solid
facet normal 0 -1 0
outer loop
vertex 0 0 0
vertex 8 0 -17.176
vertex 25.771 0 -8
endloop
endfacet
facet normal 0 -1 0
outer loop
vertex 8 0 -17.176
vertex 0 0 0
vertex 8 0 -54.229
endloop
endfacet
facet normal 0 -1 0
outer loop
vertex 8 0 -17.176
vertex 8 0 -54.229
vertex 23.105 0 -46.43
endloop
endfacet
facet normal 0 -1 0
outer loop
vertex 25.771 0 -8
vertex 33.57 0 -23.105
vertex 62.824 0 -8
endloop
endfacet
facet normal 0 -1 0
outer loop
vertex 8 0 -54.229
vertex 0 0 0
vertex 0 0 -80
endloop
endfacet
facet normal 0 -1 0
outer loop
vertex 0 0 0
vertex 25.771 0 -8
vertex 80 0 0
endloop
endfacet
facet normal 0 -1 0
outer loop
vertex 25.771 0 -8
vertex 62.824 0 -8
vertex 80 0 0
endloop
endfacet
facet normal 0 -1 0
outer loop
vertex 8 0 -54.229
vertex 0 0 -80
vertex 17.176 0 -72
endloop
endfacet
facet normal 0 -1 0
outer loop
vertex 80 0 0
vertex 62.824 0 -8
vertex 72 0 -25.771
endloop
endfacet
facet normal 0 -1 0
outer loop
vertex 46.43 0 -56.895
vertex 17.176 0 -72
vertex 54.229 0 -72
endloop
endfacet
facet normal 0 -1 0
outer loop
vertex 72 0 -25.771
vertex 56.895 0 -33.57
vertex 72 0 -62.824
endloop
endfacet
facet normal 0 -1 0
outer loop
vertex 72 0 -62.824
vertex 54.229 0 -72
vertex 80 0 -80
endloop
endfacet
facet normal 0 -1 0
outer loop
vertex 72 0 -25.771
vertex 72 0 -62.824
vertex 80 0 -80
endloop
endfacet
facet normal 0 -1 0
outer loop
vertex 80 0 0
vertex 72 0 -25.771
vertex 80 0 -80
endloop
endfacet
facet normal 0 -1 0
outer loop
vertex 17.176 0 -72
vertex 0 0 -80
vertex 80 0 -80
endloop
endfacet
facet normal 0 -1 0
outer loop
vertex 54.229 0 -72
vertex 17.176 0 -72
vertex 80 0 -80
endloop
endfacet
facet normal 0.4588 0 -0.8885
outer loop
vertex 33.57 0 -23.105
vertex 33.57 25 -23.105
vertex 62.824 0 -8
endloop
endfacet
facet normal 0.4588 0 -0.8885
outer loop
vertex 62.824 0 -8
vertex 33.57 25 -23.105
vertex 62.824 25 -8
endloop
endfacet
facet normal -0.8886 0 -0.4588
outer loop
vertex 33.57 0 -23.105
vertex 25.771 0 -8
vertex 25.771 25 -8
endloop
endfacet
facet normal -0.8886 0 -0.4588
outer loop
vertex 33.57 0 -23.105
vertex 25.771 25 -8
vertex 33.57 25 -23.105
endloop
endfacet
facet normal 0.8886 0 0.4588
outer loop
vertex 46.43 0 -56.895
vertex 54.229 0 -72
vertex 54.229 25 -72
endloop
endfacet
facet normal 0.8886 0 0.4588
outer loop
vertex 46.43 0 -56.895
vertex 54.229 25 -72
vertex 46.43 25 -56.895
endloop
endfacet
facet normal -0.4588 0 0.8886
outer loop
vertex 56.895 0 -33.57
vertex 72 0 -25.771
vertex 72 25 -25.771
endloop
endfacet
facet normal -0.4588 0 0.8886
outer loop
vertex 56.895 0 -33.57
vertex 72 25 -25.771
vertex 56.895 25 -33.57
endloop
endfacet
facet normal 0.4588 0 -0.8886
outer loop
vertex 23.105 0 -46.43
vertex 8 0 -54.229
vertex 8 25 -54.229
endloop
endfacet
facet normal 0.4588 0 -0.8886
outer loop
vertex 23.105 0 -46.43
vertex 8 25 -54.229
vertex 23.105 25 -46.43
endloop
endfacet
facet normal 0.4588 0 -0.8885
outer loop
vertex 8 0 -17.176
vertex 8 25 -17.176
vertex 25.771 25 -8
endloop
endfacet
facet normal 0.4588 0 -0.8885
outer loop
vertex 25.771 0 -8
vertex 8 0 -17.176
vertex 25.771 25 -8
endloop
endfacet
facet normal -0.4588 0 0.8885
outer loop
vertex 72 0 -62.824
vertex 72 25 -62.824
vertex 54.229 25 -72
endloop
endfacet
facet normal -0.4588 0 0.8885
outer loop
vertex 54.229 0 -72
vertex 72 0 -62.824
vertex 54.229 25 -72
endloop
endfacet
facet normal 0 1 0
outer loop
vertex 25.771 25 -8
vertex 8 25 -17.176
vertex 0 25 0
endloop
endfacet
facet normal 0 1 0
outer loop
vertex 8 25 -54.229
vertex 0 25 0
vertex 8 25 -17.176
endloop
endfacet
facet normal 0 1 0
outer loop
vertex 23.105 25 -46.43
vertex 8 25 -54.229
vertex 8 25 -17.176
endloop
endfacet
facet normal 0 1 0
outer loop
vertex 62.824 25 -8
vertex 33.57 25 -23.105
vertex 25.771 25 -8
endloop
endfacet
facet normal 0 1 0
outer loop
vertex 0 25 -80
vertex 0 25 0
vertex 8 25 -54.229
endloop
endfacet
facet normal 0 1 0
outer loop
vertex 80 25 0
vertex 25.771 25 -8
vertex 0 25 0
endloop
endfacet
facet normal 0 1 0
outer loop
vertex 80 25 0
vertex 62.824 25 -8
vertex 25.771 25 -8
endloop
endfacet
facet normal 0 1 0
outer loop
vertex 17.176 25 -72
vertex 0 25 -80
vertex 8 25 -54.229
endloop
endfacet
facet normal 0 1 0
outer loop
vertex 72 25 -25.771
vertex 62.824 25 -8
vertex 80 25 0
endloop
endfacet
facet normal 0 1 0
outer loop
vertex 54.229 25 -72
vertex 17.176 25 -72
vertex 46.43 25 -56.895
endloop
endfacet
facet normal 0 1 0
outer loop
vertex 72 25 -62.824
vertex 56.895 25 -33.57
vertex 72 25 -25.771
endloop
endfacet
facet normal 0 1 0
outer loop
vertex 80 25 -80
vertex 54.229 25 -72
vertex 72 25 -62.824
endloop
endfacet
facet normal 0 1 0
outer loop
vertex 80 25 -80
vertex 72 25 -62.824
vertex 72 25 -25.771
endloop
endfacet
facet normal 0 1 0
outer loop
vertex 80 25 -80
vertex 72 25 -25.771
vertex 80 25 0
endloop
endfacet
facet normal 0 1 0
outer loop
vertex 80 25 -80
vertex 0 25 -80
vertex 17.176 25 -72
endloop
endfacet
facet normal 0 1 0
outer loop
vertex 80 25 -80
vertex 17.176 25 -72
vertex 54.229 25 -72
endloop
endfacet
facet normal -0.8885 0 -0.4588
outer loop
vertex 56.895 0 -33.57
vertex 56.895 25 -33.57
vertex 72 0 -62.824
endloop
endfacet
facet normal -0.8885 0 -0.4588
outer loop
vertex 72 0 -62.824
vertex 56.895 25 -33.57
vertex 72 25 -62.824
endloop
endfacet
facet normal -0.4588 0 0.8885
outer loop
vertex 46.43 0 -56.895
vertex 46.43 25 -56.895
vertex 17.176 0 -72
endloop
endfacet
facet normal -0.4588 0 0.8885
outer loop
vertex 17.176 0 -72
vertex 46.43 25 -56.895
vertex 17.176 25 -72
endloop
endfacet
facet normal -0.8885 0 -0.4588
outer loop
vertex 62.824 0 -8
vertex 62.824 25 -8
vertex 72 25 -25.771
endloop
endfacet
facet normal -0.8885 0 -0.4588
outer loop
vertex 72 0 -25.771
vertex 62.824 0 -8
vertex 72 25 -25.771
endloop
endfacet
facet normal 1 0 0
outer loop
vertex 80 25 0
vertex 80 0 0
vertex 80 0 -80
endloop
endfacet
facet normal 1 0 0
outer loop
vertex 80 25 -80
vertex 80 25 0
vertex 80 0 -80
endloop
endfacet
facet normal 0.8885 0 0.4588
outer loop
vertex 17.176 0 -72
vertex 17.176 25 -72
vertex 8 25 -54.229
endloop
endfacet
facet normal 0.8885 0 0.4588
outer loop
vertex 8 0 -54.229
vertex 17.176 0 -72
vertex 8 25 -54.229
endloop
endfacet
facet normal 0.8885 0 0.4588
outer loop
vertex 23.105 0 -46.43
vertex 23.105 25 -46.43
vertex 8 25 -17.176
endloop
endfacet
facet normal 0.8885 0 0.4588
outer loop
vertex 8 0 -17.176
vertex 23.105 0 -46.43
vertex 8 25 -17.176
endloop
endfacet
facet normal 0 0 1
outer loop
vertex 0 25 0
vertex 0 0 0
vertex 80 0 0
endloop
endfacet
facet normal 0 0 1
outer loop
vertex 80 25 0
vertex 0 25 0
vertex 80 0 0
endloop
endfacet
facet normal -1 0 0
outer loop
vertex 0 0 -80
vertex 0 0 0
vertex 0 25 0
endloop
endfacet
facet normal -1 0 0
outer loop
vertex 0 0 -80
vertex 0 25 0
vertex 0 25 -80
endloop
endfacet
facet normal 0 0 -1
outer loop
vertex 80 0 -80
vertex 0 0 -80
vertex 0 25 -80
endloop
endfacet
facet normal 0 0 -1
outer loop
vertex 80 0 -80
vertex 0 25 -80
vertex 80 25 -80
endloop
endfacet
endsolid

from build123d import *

# Parameters (mm, degrees)
SKETCH1_W           = 80
SKETCH1_H           = 80
BOSS_EXTRUDE1_DEPTH = 25
CUT_EXTRUDE1_DEPTH  = 116.866302263


with BuildPart() as part:
    # Sketch1 → Boss-Extrude1 (new body)
    with BuildSketch(Plane(origin=(0, 0, 0), x_dir=(1, 0, 0), z_dir=(0, 1, 0))):
        with Locations((40, 40)):
            Rectangle(SKETCH1_W, SKETCH1_H)
    extrude(amount=BOSS_EXTRUDE1_DEPTH)

    # Sketch2 → Cut-Extrude1 (cut, through all)
    with BuildSketch(Plane(origin=(0, 25, 0), x_dir=(1, 0, 0), z_dir=(0, 1, 0))):
        Polygon((46.429611169, 56.894824113), (17.175992553, 72), (8, 54.229204839), (23.105175887, 46.429611169), (8, 17.175992553), (25.770795161, 8), (33.570388831, 23.105175887), (62.824007447, 8), (72, 25.770795161), (56.894824113, 33.570388831), (72, 62.824007447), (54.229204839, 72), align=None)
    extrude(amount=-CUT_EXTRUDE1_DEPTH, mode=Mode.SUBTRACT)


solid = part.part
